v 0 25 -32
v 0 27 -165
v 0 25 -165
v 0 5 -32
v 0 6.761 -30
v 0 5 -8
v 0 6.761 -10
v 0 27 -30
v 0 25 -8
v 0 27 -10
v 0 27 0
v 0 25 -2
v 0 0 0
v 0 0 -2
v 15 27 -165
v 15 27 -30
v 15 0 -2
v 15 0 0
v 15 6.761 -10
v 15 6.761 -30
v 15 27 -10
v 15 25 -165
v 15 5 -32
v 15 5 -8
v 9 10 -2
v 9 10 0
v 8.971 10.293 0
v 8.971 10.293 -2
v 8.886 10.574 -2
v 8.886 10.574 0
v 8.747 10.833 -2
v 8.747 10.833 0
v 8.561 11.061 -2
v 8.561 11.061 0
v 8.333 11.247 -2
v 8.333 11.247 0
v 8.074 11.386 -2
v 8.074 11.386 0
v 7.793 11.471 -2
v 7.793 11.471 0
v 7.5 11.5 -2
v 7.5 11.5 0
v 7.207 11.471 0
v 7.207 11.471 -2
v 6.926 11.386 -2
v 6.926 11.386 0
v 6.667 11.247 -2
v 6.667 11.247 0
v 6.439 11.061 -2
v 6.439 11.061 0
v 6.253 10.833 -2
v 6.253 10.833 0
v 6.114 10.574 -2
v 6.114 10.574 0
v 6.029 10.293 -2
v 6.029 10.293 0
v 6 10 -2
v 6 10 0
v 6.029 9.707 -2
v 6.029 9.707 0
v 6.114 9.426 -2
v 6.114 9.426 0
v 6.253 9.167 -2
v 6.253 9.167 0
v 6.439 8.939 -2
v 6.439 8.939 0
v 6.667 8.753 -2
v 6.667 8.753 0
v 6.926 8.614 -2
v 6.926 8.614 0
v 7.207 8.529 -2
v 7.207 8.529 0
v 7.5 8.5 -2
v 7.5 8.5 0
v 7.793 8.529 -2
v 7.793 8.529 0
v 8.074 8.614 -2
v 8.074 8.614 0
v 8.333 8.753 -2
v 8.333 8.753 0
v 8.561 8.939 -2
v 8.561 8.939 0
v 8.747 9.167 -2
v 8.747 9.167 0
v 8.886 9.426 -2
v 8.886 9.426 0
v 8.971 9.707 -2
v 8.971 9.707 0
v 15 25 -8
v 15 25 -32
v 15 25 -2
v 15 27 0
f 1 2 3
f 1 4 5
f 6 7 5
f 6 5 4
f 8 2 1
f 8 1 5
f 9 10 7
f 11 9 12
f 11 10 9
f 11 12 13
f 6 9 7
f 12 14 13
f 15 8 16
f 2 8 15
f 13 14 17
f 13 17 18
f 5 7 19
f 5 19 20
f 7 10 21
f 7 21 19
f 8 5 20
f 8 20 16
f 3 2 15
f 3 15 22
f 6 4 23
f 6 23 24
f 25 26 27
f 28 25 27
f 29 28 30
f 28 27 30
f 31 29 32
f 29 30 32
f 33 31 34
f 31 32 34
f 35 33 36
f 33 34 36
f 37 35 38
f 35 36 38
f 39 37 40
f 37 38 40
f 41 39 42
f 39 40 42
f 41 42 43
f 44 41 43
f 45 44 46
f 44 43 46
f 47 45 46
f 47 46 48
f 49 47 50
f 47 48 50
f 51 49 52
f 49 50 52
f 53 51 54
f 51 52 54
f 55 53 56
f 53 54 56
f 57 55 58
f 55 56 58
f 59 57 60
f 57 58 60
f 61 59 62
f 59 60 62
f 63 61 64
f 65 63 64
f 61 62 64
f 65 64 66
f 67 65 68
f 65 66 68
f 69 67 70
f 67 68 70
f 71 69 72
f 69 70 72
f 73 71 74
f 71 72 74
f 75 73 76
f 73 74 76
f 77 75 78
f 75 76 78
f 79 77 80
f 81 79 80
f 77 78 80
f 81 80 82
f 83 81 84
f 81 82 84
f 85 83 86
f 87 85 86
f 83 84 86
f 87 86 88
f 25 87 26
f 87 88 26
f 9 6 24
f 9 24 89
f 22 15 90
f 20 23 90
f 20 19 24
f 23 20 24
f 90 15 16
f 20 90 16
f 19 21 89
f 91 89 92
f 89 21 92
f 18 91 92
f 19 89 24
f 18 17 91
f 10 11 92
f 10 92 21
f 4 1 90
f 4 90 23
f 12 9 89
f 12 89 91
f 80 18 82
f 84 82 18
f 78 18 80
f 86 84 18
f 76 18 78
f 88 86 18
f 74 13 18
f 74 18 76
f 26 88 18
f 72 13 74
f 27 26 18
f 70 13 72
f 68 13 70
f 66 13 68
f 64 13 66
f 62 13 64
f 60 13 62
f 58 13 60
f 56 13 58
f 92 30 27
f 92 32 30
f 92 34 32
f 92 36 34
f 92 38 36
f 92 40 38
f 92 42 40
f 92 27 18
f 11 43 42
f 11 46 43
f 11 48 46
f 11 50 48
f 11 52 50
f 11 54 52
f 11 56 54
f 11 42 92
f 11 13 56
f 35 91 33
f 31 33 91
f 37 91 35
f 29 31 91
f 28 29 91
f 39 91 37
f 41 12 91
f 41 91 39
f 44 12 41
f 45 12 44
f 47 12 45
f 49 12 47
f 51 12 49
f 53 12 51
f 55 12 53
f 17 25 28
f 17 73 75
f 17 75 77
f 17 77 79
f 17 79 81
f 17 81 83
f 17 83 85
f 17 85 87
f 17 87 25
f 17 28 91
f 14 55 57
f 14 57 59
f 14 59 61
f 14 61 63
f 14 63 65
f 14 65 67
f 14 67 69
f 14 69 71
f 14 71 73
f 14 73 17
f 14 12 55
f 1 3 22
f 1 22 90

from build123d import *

# Parameters (mm, degrees)
BOSS_EXTRUDE1_DEPTH = 15
SKETCH3_R           = 1.5
CUT_EXTRUDE1_DEPTH  = 2


with BuildPart() as part:
    # Sketch2 → Boss-Extrude1 (new body)
    with BuildSketch(Plane(origin=(0, 0, 0), x_dir=(0, 0, -1), z_dir=(1, 0, 0))):
        Polygon((0, 27), (10, 27), (10, 6.760833057), (30, 6.760833057), (30, 27), (165, 27), (165, 25), (32, 25), (32, 5), (8, 5), (8, 25), (2, 25), (2, 0), (0, 0), align=None)
    extrude(amount=BOSS_EXTRUDE1_DEPTH)

    # Sketch3 → Cut-Extrude1 (cut)
    with BuildSketch(Plane.XY):
        with Locations((7.5, 10)):
            Circle(SKETCH3_R)
    extrude(amount=-CUT_EXTRUDE1_DEPTH, mode=Mode.SUBTRACT)


solid = part.part
